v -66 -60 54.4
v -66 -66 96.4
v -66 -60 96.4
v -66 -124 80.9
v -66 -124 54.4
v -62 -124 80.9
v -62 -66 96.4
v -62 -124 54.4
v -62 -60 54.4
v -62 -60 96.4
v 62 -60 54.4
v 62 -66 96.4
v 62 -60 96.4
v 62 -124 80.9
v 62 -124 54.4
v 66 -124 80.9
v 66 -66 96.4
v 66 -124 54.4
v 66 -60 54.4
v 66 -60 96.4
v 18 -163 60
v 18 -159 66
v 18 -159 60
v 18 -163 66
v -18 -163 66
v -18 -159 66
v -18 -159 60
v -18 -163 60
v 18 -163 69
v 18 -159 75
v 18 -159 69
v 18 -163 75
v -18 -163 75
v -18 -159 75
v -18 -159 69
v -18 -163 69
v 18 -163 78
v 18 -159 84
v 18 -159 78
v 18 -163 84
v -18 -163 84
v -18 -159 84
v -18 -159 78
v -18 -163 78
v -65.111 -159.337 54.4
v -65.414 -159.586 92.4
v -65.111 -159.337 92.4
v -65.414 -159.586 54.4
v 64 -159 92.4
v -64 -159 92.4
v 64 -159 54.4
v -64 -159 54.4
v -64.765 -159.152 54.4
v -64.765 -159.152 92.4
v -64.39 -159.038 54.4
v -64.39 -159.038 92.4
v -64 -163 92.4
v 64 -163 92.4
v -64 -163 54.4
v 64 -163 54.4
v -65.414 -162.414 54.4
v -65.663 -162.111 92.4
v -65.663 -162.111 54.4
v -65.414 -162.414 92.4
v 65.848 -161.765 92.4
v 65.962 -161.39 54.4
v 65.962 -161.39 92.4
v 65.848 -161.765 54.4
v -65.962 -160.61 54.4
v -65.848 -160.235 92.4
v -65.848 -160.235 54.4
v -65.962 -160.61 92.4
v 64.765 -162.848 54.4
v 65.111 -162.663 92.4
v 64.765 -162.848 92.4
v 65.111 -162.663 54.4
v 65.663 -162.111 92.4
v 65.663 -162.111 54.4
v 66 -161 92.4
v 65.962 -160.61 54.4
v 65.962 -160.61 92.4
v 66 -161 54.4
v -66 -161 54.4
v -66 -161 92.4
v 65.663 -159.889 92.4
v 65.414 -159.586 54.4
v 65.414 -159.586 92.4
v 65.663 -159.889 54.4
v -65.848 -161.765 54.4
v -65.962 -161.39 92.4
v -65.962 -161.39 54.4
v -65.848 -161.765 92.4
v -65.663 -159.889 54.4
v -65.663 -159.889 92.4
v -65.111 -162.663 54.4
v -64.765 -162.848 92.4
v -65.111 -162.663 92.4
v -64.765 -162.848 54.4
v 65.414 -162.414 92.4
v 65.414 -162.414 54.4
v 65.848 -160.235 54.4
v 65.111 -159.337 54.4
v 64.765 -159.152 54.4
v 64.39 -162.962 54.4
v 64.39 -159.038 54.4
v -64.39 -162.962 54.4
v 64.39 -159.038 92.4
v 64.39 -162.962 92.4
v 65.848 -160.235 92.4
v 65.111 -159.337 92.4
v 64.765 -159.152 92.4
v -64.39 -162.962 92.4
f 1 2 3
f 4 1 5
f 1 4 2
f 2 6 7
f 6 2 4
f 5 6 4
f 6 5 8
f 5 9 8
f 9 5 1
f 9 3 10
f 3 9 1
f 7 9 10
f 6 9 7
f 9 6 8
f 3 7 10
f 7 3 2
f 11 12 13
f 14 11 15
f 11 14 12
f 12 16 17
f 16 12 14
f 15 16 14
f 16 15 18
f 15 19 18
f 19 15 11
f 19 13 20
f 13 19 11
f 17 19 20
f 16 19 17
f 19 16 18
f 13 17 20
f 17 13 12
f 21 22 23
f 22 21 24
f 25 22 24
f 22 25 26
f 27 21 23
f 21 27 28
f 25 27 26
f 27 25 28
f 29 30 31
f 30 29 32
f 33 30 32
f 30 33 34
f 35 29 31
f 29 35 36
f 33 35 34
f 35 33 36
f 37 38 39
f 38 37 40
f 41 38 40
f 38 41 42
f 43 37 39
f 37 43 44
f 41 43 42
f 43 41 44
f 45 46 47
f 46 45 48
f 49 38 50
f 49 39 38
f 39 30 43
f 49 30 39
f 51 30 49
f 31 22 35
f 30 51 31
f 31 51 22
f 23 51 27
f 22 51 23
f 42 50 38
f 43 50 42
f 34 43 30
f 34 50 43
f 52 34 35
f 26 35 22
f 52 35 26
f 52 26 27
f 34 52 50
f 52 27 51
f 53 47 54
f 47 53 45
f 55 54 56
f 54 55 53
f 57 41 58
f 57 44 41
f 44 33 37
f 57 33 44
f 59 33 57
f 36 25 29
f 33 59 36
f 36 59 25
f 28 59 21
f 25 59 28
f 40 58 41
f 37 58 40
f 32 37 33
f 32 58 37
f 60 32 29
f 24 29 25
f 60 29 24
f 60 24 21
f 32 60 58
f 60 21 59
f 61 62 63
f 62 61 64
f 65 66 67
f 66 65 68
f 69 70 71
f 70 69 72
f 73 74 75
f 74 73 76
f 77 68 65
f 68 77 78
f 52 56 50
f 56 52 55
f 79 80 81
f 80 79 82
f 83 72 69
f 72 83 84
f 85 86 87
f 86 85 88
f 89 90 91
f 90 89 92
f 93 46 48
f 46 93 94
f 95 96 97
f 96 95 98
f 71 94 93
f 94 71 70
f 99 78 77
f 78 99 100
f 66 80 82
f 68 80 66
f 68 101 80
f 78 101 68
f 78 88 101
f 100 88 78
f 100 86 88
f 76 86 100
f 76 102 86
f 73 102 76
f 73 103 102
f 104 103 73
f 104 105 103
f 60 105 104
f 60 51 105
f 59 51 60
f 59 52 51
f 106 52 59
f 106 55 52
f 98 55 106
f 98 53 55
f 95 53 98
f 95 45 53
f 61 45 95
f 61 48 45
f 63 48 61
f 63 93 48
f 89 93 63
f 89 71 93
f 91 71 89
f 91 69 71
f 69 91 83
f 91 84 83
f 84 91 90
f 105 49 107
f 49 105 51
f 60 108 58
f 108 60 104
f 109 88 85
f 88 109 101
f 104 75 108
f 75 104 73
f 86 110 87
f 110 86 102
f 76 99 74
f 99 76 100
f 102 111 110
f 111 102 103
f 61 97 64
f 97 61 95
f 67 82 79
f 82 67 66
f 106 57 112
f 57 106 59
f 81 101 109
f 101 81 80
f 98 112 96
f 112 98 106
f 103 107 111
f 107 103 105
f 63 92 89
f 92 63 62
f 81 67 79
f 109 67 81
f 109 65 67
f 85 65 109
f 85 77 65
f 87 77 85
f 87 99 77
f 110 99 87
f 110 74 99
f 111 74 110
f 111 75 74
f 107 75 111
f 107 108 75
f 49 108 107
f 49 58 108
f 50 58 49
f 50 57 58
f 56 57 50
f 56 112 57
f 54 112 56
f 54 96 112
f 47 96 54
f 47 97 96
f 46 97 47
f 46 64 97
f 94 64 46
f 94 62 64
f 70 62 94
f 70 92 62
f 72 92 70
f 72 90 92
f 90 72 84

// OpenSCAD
// file: ../lib.scad
/* =====================================================================
   공용 헬퍼 라이브러리 — params.scad 를 include 한 뒤 사용
   ===================================================================== */

/* 두 점을 잇는 둥근 끝 튜브(캡슐) — 용접 조인트처럼 자연스럽게 합쳐짐 */
module rod(p1, p2, od, fn=rod_fn)
    hull() {
        translate(p1) sphere(d=od, $fn=fn);
        translate(p2) sphere(d=od, $fn=fn);
    }

/* 로컬 +Z 축을 p1→p2 방향으로 정렬 (자식 배치용)
   Rz(φ)·Ry(θ)·ẑ = v̂  →  외부 Z 회전, 내부 Y 회전 순서 */
module orient(p1, p2) {
    v = p2 - p1;
    h = norm([v.x, v.y]);
    translate(p1)
        rotate([0, 0, atan2(v.y, v.x)])
        rotate([0, atan2(h, v.z), 0])
        children();
}

/* 모서리가 둥근 수직 판 (x=폭, y=길이, z0~z1) */
module plate(x, y, z0, z1, r=4, fn=32)
    hull()
        for (px = [-1, 1], py = [-1, 1])
            translate([px*(x/2 - r), py*(y/2 - r), z0])
                cylinder(r = r, h = z1 - z0, $fn = fn);

/* 코일오버 스프링 (로컬 +Z 축, z0~z1 구간에 링 n개) */
module coil(z0, z1, R = spring_R, t = spring_t, n = spring_n)
    for (i = [0 : n-1])
        translate([0, 0, z0 + i*(z1 - z0)/(n - 1)])
            rotate_extrude($fn = coil_fn)
                translate([R, 0]) circle(d = t, $fn = 16);

/* 쇼크업소버 (로컬 +Z 축, 하단 아이 z=0, 전장 L) */
module shock(L) {
    cylinder(d = shock_body_od, h = L*0.45, $fn = rod_fn);              // 댐퍼 바디
    translate([0, 0, L*0.45])
        cylinder(d = shock_rod_od, h = L*0.45 - 4, $fn = rod_fn);       // 로드
    coil(L*0.14, L*0.72);                                               // 스프링
    translate([0, 0, 2])   cube([10, 10, 4], center = true);            // 하단 아이 러그
    translate([0, 0, L-2]) cube([10, 10, 4], center = true);            // 상단 아이 러그
}
// file: ../params.scad
/* =====================================================================
   RC 오프로드 버기 (1:10) — 전역 파라미터
   단위: mm | 바닥면 z=0 | +Z 위 | +Y 전진 | +X 우측
   주요 치수는 이 파일 하나에서 일괄 수정 가능
   ===================================================================== */
$fn      = 64;    // 기본 곡면 해상도
rod_fn   = 48;    // 구조 튜브(캡슐) 해상도
wheel_fn = 96;    // 휠 원주 해상도
coil_fn  = 48;    // 쇼크 스프링 링 해상도

/* ------------------ 차량 기준 치수 ------------------ */
L_total   = 400;             // 전장
W_total   = 250;             // 전폭
WB        = 260;             // 휠베이스
wheel_dia = 110;             // 휠 외경(트레드 블록 포함)
wheel_r   = wheel_dia / 2;

/* ------------------ 섀시 플레이트 ------------------ */
chassis_z_bot   = 50;                        // 섀시 하면 높이(스키드 기준 지상고)
chassis_t       = 4;                         // 플레이트 두께
chassis_z_top   = chassis_z_bot + chassis_t;
chassis_hw      = 70;                        // 기본 반폭
chassis_taper_y = 140;                       // 앞뒤 테이퍼 시작 |y|
chassis_y_f     =  172;  chassis_hw_f = 55;  // 프런트 끝 (y, 반폭)
chassis_y_r     = -172;  chassis_hw_r = 58;  // 리어 끝   (y, 반폭)
rail_w = 8;  rail_h = 6;                     // 측면 강화 레일 단면

/* ------------------ 휠 / 타이어 ------------------ */
tire_w_f = 42;   hub_f_x = 104;   axle_f_y =  130;   // 프런트: 폭/허브x/액슬y
tire_w_r = 50;   hub_r_x = 100;   axle_r_y = -130;   // 리어(와이드)
hub_z    = wheel_r;                             // 허브 높이 = 접지
tire_carcass_r = 52.5;   // 카카스 외경 반지름(블록 돋음 전)
tire_bore_r    = 36;     // 타이어 내경 = 림 시트 반지름
tread_n     = 20;        // 트레드 블록 개수(행당)
tread_depth = 2.5;       // 블록 돋음 → 외경 110mm
tread_len   = 9;         // 블록 접선방향 길이
tread_w     = 8.5;       // 블록 축방향 폭
rim_wall = 3;  rim_gap = 0.4;  bead_t = 2.5;
hub_disc_r = 17;

/* ------------------ 롤 케이지 (6포인트) ------------------ */
tube_od   = 9;     // 메인 튜브 외경
tube_od_s = 7;     // 보조 튜브 외경
cage_fx = 58; cage_fy =  42;  cage_ft = [56,  38, 112]; // 프런트 후프 발(x,y)→상단
cage_mx = 58; cage_my = -48;  cage_mt = [55, -48, 128]; // 메인 후프
cage_sx = 52; cage_sy = -98;                            // 리어 스테이 발
foot_t = 5;                                             // 발판 두께

/* ------------------ 서스펜션 (더블 위시본) ------------------ */
arm_od     = 7;      // A-arm 튜브 외경
bush_od    = 10;     // 피벗 부싱 외경
lwr_bush_x = 75.5;   // 로어 부싱 x(섀시 측면 외측)
lwr_dy     = 12;     // 로어 부싱 y 오프셋(액슬 기준)
lwr_z      = 50;     // 로어 아암 높이
knk_f      = 100;    // 프런트 너클 x
knk_r      = 96;     // 리어 너클 x
upr_piv_x  = 56;     // 어퍼 피벗 타워 x
upr_z      = 72;     // 어퍼 아암 높이
tower_fx = 47; tower_fy =  107; tower_top = 99;  // 프런트 쇼크 타워
tower_rx = 47; tower_ry = -151;                  // 리어 쇼크 타워
shock_body_od = 9;  shock_rod_od = 3.5;
spring_R = 6.5;  spring_t = 2.0;  spring_n = 6;

/* ------------------ 파워트레인 ------------------ */
eng_hw=35;  eng_yf=-68;   eng_yr=-110;  eng_top=88;         // 엔진 블록(yf=앞, yr=뒤)
head_hw=30; head_yf=-84;  head_yr=-112;  head_top=100;      // 실린더 헤드
rad_hw=50;  rad_y0=155;   rad_y1=165;  rad_z0=77; rad_z1=109; // 라디에이터

/* ------------------ 공통 ------------------ */
gap = 0.4;                    // 부품 간 결합 클리어런스
z0  = chassis_z_top + gap;    // 섀시 위에 올라가는 부품의 기준 하면
// main file
/* 08. 리어 바디 — 엔진 베이 사이드 패널 좌우 + 벤틸레이션 슬롯 리어 패널
   사이드 패널은 리어 어퍼 아암(y≈-130) 관통 회피 위해 y=-124까지 */
include <../params.scad>
include <../lib.scad>

module part_rear_body() {
    // 사이드 패널 (앞이 높고 뒤로 낮아지는 테이퍼, 두께 4)
    for (s = [-1, 1])
        hull() {
            translate([s*64, -63,  z0 + 21])    cube([4, 6, 42],   center = true);  // 프런트 에지 z0~96.4
            translate([s*64, -121, z0 + 13.25]) cube([4, 6, 26.5], center = true);  // 리어 에지   z0~80.9
        }
    // 리어 패널 (y -163~-159) + 벤틸 슬롯 3개
    difference() {
        translate([0, -161, 0]) plate(132, 4, z0, 92.4, r = 2);
        for (sz = [63, 72, 81])
            translate([0, -161, sz]) cube([36, 8, 6], center = true);
    }
}

part_rear_body();
